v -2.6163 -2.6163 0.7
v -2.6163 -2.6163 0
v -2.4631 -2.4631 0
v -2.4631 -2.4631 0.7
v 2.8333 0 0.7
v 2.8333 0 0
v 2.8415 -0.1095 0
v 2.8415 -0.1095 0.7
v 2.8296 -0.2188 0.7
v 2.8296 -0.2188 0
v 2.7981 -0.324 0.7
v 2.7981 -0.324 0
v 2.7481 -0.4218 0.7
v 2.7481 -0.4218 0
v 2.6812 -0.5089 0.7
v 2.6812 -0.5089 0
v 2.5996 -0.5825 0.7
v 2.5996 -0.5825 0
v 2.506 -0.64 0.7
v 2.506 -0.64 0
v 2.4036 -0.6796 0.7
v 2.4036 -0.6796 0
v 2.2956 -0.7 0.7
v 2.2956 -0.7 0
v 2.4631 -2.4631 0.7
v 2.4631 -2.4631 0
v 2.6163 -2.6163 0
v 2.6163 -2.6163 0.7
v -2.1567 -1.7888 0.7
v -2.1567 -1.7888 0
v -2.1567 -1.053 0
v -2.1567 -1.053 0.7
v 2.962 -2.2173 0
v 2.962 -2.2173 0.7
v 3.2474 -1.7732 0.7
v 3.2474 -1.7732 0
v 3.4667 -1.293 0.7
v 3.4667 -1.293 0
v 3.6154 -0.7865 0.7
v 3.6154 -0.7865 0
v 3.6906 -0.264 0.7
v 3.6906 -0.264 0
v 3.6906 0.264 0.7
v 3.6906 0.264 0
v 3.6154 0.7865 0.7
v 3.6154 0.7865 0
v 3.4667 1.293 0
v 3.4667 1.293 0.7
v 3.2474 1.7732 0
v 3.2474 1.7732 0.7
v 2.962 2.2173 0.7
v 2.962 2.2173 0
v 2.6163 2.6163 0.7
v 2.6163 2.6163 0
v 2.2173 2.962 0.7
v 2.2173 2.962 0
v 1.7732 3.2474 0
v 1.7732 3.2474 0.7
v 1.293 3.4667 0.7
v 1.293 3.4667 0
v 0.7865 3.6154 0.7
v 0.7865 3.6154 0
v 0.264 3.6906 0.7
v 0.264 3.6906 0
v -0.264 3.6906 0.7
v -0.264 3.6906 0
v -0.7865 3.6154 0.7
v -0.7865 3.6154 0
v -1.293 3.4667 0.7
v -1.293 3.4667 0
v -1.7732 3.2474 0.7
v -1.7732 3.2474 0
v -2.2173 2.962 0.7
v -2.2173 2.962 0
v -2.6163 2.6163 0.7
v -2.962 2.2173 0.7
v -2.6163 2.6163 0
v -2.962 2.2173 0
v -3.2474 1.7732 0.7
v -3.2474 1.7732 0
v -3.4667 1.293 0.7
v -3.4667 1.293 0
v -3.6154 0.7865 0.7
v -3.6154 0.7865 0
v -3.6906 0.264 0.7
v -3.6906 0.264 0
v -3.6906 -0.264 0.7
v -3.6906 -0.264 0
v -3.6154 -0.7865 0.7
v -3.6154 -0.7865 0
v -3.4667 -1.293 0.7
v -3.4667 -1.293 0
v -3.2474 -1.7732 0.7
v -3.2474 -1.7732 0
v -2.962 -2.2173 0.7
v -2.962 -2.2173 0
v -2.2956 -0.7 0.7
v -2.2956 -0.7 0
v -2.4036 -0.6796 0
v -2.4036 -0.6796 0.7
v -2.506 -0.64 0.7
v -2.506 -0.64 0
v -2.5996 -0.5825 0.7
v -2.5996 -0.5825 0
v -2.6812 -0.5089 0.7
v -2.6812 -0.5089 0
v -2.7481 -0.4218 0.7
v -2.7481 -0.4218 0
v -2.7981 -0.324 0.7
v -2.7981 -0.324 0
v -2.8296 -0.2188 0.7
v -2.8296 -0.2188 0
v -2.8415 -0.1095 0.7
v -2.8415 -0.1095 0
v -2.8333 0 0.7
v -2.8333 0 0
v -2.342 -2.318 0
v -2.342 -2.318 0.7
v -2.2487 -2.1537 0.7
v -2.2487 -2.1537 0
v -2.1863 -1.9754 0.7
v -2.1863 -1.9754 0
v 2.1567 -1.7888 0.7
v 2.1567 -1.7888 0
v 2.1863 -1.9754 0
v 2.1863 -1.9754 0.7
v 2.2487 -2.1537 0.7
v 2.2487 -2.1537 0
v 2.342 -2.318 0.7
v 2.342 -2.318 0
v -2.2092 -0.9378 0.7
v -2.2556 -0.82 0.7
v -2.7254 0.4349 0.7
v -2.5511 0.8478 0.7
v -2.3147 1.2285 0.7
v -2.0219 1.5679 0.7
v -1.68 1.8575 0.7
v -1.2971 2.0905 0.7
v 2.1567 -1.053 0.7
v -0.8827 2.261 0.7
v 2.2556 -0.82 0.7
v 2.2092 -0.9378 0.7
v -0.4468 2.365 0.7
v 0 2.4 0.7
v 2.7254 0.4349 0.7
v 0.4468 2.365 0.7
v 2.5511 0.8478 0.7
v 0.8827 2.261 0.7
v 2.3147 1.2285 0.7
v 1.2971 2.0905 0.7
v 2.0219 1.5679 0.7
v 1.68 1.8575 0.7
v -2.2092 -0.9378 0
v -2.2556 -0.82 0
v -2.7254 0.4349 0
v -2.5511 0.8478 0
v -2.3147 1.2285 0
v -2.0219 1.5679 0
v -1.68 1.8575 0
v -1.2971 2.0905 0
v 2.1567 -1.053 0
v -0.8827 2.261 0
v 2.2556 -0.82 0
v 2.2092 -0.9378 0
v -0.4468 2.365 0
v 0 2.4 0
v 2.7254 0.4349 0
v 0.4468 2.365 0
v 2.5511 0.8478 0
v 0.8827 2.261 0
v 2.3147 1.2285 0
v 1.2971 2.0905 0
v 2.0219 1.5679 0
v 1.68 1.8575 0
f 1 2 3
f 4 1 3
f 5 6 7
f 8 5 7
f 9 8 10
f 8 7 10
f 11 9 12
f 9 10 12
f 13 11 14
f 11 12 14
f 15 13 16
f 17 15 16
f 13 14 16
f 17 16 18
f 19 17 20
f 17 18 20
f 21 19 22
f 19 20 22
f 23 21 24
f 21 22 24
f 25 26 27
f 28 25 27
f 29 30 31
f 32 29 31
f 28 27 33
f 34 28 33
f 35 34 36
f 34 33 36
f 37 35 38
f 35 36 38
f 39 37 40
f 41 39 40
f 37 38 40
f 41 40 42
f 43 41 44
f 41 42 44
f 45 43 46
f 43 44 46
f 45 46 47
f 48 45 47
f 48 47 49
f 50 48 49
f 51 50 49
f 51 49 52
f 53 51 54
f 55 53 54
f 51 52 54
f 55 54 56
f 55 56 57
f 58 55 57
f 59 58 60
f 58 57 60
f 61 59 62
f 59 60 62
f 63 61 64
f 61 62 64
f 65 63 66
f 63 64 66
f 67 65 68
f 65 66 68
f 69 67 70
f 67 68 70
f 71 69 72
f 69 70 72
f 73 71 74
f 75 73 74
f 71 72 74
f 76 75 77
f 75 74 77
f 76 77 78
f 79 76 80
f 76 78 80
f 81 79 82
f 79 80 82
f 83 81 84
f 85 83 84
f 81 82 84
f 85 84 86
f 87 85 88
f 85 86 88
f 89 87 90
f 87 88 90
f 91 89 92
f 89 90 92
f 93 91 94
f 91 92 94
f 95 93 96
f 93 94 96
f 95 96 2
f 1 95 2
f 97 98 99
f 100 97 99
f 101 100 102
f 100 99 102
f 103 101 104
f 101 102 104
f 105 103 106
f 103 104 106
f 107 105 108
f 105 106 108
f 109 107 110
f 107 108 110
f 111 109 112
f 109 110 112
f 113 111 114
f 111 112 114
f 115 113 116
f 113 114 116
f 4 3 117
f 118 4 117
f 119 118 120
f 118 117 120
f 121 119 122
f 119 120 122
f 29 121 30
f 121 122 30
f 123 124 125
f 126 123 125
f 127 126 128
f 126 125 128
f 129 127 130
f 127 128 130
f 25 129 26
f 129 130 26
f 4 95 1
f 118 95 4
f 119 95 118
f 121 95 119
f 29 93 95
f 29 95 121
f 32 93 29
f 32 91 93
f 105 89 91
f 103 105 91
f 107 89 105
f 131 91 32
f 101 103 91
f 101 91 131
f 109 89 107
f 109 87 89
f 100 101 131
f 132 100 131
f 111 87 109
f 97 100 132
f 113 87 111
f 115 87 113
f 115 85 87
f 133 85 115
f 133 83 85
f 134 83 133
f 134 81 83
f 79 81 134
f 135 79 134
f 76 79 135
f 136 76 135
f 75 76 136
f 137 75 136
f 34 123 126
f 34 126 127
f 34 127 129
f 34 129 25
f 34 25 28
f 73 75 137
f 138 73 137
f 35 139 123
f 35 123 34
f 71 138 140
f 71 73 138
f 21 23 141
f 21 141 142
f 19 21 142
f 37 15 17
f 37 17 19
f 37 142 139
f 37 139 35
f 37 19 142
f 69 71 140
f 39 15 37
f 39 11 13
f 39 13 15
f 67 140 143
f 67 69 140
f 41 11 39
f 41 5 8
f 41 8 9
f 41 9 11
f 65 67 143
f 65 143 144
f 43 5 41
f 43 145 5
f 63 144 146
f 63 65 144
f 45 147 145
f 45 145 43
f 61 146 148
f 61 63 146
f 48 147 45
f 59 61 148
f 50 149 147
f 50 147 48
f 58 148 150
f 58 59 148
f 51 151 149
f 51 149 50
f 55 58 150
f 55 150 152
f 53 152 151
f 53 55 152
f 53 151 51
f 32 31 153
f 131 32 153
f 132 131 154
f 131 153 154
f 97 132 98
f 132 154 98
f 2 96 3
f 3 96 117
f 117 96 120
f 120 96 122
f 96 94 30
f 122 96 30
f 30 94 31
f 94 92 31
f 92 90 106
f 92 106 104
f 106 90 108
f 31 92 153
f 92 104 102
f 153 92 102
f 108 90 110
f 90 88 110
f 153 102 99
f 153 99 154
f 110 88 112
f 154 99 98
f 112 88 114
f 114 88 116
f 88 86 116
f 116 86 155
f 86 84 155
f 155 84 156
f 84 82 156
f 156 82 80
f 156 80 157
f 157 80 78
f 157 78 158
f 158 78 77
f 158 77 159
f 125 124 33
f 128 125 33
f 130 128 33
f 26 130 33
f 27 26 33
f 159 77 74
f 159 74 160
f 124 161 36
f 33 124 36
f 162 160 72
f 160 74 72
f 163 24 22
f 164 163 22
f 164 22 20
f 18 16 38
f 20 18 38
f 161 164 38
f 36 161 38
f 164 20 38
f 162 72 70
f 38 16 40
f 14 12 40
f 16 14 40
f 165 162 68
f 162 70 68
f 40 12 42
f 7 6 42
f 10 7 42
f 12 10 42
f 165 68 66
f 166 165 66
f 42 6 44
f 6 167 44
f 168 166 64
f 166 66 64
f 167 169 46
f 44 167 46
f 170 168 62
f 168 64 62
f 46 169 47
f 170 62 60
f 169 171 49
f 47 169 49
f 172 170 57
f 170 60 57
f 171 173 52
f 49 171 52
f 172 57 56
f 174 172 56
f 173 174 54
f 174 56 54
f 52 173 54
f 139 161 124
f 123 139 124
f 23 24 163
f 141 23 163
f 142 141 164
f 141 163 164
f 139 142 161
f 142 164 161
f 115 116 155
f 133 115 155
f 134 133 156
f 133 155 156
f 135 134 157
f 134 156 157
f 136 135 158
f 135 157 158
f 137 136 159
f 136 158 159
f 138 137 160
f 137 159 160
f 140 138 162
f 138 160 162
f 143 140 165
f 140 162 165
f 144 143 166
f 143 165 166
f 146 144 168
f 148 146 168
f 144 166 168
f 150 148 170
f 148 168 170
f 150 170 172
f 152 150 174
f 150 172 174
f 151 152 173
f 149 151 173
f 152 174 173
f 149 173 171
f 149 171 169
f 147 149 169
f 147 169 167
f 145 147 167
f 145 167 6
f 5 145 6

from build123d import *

# Parameters (mm, degrees)
BOSS_EXTRUDE1_DEPTH = 0.7


with BuildPart() as part:
    # Sketch2 → Boss-Extrude1 (new body)
    with BuildSketch(Plane.XY):
        with BuildLine():
            Line((-2.156675683, -1.78877445), (-2.156675683, -1.420873217))
            Line((-2.156675683, -1.420873217), (-2.156675683, -1.052971984))
            ThreePointArc((-2.156675683, -1.052971984), (-2.233146653, -0.879236046), (-2.295648057, -0.7))
            ThreePointArc((-2.295648057, -0.7), (-2.71665879, -0.466883635), (-2.833333333, 0))
            ThreePointArc((-2.833333333, 0), (0, 2.4), (2.833333333, 0))
            ThreePointArc((2.833333333, 0), (2.71665879, -0.466883635), (2.295648057, -0.7))
            ThreePointArc((2.295648057, -0.7), (2.233146653, -0.879236046), (2.156675683, -1.052971984))
            Line((2.156675683, -1.052971984), (2.156675683, -1.420873217))
            Line((2.156675683, -1.420873217), (2.156675683, -1.78877445))
            ThreePointArc((2.156675683, -1.78877445), (2.248723901, -2.15372226), (2.463088621, -2.463088621))
            Line((2.463088621, -2.463088621), (2.61629509, -2.61629509))
            ThreePointArc((2.61629509, -2.61629509), (0, 3.7), (-2.61629509, -2.61629509))
            Line((-2.61629509, -2.61629509), (-2.463088621, -2.463088621))
            ThreePointArc((-2.463088621, -2.463088621), (-2.248723901, -2.15372226), (-2.156675683, -1.78877445))
        make_face()
    extrude(amount=BOSS_EXTRUDE1_DEPTH)


solid = part.part
